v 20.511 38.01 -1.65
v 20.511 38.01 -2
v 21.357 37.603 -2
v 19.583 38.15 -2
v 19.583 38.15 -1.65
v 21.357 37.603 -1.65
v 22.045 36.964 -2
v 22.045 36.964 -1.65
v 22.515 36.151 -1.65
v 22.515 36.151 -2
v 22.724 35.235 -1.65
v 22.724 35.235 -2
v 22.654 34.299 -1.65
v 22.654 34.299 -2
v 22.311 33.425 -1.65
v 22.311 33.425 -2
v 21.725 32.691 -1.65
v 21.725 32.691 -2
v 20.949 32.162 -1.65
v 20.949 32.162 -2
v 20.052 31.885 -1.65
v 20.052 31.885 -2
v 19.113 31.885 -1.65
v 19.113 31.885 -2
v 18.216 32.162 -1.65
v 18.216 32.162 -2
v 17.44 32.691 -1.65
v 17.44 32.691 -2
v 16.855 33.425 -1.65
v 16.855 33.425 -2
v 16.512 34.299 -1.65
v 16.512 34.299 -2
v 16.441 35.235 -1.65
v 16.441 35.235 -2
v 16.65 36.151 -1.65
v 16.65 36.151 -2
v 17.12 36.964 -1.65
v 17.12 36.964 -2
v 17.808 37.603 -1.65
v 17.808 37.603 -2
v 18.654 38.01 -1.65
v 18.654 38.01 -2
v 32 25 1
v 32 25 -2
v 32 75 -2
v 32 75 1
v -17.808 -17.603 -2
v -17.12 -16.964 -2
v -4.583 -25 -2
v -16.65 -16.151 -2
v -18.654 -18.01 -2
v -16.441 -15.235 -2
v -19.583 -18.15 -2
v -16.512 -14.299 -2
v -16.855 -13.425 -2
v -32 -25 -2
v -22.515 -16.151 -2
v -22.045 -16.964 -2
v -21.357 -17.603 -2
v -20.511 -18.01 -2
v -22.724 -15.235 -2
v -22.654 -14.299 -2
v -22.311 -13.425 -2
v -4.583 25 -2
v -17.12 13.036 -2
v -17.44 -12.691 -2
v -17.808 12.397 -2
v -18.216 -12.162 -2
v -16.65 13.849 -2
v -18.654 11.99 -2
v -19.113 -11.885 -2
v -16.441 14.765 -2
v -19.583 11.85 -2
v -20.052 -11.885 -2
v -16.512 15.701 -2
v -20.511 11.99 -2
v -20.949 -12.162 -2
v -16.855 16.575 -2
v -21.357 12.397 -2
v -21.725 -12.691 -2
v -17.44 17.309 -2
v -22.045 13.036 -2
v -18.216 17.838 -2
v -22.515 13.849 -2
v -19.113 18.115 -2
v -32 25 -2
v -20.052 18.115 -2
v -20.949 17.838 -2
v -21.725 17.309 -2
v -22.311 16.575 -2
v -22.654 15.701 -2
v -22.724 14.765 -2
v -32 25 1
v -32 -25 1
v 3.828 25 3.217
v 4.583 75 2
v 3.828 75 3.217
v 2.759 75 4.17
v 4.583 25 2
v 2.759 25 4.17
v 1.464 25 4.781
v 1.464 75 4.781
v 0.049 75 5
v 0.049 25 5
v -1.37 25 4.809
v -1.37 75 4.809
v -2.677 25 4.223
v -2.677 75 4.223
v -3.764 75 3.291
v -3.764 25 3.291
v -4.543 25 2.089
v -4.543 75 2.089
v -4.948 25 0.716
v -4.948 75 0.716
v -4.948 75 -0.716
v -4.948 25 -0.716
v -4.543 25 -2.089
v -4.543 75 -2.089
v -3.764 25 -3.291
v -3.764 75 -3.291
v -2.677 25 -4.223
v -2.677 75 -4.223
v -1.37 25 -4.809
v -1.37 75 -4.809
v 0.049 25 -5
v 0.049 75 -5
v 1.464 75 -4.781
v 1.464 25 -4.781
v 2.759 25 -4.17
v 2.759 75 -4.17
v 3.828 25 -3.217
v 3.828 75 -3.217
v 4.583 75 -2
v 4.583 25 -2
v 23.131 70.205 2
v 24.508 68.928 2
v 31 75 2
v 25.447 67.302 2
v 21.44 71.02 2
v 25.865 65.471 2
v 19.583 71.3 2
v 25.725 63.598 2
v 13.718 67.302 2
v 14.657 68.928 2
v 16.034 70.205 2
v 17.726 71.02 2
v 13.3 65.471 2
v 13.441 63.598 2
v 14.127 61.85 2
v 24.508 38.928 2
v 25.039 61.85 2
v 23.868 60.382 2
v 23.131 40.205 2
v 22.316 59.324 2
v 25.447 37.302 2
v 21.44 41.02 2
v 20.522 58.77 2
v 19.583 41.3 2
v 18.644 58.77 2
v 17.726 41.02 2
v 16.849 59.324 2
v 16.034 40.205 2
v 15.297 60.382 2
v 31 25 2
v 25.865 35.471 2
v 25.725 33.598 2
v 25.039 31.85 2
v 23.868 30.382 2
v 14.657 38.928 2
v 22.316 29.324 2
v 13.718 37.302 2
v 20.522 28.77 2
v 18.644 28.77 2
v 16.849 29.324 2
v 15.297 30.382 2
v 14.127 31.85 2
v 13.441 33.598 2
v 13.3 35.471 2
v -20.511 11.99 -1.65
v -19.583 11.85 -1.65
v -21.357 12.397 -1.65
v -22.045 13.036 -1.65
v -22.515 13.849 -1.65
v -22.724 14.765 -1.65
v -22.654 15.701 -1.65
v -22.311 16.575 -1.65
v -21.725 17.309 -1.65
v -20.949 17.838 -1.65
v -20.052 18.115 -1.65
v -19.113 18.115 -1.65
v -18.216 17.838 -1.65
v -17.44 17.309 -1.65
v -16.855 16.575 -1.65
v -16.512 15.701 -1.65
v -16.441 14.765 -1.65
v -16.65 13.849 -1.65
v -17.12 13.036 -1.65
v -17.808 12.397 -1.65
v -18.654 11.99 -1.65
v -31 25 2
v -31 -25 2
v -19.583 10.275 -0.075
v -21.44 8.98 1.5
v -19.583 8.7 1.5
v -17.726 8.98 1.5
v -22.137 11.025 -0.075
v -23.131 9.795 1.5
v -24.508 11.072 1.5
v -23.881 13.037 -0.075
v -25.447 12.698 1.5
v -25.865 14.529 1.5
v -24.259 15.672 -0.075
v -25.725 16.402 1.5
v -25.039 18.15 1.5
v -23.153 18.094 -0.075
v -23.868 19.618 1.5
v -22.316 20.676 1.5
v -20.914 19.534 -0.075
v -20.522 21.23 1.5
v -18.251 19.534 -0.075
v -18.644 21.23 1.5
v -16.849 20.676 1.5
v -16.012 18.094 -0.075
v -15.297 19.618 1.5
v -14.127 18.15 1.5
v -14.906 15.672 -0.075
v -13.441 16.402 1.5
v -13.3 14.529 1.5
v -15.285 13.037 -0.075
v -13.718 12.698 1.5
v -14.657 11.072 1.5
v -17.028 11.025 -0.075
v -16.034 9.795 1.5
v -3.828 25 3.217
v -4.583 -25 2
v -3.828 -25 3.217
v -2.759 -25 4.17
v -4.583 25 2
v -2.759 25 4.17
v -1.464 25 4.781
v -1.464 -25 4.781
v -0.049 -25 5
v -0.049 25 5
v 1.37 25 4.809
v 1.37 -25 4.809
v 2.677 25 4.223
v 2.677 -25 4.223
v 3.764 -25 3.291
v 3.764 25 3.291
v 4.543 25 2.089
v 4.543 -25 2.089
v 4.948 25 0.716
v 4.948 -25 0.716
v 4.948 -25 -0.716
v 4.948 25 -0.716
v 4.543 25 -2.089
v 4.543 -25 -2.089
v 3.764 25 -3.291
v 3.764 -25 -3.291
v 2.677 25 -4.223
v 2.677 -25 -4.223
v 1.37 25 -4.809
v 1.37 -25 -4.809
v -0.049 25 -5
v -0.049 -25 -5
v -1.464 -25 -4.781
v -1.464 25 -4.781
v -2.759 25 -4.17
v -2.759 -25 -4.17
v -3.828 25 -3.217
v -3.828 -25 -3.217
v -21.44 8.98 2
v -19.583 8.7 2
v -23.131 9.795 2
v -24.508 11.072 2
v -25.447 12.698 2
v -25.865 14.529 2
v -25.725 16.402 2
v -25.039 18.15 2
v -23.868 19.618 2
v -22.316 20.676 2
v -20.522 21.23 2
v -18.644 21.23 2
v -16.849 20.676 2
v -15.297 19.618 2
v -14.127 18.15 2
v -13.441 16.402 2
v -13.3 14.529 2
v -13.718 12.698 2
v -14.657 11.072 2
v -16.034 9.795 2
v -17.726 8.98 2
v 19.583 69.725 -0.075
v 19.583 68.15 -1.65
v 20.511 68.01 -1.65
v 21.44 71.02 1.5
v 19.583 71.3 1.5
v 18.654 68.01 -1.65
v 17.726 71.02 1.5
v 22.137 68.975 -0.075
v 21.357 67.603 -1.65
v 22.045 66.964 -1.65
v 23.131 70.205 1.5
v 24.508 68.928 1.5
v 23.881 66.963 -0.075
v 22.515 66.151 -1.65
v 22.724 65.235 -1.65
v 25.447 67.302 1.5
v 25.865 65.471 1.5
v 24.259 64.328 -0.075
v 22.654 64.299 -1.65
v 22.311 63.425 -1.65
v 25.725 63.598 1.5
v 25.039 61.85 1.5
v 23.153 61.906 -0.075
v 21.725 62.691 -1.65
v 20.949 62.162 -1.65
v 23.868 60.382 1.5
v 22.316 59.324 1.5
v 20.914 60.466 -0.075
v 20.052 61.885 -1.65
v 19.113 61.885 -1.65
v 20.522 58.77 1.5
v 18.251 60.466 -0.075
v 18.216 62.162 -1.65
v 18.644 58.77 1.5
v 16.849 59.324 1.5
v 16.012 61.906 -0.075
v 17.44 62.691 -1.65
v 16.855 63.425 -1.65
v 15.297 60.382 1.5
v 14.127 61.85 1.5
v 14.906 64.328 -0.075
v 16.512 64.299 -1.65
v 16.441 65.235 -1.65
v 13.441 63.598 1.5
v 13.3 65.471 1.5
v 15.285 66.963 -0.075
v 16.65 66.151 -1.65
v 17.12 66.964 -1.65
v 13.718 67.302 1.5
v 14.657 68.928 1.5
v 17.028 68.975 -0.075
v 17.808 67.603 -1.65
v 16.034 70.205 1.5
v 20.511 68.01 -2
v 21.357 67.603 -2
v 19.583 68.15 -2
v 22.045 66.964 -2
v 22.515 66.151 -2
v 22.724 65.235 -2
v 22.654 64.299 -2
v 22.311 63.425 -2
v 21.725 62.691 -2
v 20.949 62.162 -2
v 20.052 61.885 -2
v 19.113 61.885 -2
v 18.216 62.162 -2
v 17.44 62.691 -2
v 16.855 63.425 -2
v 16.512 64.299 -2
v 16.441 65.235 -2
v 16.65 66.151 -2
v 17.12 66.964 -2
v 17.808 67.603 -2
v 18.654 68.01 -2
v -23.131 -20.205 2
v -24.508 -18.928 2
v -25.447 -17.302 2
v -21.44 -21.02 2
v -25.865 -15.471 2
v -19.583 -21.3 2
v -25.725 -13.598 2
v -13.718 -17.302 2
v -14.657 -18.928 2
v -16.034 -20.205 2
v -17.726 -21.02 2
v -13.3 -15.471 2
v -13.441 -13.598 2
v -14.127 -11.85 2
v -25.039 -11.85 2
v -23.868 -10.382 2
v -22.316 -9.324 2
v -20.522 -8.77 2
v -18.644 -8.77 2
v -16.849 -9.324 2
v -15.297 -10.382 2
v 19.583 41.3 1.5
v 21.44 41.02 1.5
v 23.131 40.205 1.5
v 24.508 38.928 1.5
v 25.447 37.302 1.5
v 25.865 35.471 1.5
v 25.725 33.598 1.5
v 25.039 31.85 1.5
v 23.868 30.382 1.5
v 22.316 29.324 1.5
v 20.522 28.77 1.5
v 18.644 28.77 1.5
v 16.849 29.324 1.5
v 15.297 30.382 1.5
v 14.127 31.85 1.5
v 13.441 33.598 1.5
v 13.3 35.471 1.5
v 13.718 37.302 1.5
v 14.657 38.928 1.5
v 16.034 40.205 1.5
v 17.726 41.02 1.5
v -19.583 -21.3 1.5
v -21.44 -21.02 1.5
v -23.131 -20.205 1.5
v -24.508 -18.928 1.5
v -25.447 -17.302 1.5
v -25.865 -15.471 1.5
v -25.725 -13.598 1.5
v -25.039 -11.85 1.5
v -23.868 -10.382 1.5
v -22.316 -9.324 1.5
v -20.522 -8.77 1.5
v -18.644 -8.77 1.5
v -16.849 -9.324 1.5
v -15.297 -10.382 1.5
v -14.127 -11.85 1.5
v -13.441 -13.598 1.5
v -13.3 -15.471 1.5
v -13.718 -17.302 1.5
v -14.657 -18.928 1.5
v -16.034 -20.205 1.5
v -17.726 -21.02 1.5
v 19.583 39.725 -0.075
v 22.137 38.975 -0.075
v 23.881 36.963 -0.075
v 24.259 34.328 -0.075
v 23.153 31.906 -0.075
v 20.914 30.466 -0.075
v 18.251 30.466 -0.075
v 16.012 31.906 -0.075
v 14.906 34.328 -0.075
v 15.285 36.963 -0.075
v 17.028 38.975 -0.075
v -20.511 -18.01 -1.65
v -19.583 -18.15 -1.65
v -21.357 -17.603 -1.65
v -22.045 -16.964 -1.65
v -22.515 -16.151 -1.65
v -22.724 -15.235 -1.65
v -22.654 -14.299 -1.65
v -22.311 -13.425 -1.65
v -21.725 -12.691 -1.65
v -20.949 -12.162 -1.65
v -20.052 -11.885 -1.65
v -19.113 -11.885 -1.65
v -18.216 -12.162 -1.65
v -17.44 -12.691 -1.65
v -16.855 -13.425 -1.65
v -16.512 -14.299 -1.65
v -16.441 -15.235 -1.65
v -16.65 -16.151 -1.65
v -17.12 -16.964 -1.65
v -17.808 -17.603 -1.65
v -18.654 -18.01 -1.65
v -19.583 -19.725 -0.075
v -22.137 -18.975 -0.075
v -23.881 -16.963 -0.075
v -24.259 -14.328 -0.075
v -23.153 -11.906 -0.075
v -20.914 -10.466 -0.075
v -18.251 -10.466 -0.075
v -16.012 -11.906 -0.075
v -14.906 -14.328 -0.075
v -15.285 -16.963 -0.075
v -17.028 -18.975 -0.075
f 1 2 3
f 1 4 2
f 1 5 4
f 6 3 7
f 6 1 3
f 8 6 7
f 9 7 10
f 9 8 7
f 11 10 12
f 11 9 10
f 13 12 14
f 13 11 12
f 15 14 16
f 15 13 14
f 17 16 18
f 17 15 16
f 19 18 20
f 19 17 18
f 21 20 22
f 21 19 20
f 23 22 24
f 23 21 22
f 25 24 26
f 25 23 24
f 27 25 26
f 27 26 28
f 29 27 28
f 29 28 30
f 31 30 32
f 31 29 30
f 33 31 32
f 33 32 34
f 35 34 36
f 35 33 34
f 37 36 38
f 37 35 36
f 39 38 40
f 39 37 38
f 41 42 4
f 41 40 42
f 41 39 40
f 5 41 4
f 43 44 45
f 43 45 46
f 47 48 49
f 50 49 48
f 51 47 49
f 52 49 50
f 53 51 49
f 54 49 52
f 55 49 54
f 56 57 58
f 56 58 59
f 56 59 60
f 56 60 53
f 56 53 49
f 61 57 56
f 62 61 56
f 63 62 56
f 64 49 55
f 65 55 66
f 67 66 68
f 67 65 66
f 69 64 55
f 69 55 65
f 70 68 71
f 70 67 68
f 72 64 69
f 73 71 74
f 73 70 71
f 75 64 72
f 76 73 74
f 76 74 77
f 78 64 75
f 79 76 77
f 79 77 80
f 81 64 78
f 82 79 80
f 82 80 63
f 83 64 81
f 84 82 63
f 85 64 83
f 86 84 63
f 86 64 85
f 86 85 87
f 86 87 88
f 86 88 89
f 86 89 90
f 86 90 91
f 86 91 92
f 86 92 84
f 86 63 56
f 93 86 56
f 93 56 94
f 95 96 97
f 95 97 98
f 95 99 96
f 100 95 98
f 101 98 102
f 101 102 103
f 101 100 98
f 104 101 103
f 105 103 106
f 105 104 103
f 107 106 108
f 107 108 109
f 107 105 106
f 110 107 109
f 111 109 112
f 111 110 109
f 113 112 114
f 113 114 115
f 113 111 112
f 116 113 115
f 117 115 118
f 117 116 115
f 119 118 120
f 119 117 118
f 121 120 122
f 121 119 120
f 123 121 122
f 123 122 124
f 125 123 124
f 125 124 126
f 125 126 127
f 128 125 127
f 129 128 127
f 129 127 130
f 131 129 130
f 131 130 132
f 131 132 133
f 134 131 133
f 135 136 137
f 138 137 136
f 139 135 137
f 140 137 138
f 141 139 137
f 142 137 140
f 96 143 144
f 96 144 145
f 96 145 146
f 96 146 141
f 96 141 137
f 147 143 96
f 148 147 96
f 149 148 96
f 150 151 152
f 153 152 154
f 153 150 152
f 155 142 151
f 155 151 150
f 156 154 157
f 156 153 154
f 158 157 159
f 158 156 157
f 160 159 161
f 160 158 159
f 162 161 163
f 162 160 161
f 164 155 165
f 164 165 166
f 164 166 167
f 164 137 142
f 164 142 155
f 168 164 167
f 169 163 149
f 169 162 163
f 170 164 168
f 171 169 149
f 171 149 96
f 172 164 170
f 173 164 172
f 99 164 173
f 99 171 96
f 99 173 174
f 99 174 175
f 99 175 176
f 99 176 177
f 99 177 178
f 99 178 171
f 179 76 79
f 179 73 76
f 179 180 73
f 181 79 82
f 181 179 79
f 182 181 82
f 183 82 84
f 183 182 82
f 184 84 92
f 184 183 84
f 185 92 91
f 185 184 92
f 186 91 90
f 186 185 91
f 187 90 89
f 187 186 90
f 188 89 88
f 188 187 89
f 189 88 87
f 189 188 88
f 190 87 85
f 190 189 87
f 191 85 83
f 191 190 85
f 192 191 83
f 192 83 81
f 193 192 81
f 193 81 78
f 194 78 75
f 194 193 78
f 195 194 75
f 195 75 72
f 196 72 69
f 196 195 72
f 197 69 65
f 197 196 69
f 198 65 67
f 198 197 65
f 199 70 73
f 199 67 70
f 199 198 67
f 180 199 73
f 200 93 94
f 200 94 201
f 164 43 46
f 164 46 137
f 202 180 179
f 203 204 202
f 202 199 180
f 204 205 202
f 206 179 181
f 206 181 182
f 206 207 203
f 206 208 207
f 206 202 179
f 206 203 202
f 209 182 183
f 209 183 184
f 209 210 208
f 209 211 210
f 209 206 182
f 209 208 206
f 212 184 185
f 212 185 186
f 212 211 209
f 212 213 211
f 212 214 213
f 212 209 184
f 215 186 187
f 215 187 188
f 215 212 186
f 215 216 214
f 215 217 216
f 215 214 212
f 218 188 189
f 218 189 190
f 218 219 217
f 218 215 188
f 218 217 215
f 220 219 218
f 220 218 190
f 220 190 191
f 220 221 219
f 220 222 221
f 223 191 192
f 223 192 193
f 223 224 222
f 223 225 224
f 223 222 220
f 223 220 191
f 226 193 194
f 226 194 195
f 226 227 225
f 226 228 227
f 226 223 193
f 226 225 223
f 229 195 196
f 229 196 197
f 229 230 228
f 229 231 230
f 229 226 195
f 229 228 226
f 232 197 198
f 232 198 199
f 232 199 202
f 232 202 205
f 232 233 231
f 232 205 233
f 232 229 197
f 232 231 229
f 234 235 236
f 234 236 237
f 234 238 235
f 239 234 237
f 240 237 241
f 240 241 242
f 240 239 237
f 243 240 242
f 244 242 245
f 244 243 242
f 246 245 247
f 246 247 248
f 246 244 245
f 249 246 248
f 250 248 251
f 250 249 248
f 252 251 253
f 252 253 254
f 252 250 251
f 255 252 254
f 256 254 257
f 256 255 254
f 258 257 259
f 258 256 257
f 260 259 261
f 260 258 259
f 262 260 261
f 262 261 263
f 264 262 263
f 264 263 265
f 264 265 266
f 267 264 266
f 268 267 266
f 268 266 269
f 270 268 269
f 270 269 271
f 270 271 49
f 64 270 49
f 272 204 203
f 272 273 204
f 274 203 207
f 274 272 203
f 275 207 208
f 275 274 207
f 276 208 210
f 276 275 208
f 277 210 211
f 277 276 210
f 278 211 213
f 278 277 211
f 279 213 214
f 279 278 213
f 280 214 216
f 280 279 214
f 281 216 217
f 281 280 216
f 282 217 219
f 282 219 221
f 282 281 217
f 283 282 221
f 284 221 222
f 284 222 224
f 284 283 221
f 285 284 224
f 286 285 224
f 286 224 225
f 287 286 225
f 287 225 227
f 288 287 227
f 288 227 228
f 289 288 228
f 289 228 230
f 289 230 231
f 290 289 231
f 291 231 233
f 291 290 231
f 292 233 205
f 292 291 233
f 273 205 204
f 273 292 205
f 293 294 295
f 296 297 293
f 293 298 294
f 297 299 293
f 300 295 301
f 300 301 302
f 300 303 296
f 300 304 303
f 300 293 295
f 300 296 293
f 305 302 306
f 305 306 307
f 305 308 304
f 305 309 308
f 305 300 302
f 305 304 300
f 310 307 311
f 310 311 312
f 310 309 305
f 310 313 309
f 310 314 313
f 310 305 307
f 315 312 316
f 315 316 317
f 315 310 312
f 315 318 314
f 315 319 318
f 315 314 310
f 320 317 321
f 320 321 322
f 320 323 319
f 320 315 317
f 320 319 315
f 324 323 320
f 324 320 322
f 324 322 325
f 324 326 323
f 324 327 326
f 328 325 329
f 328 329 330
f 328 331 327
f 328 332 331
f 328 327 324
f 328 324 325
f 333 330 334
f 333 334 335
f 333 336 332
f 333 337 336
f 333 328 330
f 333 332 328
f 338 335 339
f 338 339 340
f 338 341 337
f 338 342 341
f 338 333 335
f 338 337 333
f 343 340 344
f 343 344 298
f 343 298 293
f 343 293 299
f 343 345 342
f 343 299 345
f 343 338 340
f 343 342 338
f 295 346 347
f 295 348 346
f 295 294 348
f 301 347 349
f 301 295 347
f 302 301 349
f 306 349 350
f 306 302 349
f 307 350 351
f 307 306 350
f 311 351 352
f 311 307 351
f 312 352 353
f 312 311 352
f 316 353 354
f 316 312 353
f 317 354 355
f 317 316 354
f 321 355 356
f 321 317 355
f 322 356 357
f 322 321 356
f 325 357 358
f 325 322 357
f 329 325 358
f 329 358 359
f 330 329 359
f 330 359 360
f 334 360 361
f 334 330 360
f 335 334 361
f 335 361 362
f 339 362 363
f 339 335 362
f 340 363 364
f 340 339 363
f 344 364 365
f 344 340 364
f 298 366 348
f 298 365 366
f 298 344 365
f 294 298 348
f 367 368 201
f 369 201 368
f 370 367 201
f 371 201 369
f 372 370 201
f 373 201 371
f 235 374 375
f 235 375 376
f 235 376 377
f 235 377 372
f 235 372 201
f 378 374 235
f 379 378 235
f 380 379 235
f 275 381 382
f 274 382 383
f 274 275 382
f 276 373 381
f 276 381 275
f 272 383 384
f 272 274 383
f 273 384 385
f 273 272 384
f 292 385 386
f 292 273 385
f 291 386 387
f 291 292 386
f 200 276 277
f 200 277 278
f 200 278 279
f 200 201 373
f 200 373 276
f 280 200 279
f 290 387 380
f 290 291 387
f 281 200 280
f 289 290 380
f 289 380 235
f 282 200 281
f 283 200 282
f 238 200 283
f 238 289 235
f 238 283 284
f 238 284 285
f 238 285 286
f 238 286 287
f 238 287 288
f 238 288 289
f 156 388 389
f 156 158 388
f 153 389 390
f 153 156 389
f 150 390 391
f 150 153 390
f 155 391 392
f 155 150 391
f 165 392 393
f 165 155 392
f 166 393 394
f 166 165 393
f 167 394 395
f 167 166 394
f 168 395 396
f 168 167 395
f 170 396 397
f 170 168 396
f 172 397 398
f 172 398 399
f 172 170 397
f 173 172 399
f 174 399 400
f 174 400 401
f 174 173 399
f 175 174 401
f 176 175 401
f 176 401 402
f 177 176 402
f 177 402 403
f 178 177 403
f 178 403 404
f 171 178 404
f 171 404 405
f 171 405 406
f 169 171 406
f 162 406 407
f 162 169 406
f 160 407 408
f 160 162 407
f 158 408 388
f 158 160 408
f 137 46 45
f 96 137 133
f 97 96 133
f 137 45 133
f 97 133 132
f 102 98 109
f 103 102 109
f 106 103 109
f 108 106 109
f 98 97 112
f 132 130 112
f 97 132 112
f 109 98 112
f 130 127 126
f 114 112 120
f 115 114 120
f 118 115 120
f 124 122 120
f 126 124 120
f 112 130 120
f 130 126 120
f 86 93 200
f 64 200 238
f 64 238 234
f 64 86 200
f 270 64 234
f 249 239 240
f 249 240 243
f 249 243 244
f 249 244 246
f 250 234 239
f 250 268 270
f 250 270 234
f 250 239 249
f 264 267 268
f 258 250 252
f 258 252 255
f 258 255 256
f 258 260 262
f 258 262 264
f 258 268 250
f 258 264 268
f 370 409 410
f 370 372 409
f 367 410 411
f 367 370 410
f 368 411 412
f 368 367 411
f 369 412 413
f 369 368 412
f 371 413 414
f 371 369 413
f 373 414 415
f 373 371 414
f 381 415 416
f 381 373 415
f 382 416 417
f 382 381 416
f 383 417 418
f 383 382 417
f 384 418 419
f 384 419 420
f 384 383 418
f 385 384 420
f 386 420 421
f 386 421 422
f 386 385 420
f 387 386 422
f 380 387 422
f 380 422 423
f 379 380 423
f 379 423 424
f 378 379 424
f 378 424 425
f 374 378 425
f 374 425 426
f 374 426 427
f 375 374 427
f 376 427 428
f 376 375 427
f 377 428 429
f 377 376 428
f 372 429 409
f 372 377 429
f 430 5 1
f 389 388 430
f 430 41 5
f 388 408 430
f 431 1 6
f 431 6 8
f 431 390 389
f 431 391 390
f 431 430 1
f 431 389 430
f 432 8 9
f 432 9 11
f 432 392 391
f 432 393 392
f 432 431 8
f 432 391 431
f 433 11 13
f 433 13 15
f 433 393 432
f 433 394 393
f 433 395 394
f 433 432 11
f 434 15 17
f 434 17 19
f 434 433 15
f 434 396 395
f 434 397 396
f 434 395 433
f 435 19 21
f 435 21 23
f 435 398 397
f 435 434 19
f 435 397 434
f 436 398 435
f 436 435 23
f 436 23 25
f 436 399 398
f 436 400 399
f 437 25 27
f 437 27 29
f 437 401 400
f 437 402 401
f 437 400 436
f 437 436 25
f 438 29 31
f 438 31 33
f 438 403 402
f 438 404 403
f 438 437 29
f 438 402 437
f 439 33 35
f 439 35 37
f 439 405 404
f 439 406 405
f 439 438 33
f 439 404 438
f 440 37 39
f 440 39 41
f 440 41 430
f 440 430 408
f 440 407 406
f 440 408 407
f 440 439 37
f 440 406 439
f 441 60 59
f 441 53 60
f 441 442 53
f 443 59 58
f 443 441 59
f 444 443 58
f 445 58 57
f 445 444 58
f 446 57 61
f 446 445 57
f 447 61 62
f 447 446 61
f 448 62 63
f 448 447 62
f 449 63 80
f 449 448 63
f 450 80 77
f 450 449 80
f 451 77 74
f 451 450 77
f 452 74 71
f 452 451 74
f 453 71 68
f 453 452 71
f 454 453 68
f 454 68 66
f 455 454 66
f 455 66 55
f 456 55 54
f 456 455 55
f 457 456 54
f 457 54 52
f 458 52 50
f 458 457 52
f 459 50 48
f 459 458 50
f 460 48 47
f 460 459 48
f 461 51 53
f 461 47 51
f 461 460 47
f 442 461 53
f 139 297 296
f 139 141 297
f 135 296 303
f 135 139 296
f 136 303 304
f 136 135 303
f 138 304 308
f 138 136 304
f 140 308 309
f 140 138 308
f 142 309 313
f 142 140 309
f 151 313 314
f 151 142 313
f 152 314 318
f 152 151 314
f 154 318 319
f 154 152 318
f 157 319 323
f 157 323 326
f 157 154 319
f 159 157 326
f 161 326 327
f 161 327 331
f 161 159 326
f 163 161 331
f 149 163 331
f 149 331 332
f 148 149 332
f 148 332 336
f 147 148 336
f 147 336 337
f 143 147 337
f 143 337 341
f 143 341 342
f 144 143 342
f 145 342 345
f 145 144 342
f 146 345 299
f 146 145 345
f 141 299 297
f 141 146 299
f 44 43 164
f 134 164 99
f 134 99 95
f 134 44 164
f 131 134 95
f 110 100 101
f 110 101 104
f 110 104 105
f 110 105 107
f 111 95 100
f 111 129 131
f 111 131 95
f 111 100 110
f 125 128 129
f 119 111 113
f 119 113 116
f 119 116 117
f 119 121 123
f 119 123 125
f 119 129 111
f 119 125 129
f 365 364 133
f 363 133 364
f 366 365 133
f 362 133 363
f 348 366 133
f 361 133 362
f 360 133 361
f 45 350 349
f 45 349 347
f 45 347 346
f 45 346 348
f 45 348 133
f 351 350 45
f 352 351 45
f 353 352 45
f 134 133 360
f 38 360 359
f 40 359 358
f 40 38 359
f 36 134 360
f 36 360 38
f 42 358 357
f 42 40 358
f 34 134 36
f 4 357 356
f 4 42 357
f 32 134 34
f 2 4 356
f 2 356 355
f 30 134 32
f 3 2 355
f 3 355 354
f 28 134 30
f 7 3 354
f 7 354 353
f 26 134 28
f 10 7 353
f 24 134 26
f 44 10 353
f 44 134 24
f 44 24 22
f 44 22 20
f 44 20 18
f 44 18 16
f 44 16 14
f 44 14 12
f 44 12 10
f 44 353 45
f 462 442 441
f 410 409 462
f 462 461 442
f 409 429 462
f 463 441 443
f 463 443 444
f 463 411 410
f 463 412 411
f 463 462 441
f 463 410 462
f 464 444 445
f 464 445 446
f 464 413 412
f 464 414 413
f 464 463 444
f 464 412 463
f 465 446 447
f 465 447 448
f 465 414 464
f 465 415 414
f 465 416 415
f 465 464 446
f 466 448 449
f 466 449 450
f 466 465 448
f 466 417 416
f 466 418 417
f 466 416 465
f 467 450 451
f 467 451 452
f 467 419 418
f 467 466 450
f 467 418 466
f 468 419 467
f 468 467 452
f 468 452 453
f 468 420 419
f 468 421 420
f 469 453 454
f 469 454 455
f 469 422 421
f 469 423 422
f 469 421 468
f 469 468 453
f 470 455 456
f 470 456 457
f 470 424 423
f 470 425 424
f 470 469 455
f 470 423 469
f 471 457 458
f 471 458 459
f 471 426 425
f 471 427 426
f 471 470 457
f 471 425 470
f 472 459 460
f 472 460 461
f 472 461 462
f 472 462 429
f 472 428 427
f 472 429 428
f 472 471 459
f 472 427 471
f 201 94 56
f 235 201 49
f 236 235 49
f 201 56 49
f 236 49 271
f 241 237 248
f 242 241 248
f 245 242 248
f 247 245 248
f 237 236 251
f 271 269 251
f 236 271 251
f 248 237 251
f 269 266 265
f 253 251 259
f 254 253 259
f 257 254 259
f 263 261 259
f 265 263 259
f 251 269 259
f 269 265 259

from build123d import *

# Parameters (mm, degrees)
EXTRUDE_1_DEPTH            = 25
HOLE_WIZARD_M61_AT_2_COUNT = 2
HOLE_WIZARD_M61_AT_2_PITCH = 30
PATTERN_CIRCULAR_1_COUNT   = 2


with BuildPart() as part:
    # Эскиз1 → Бобышка-Вытянуть1 (new body, symmetric)
    with BuildSketch(Plane(origin=(0, 0, 0), x_dir=(1, 0, 0), z_dir=(0, 1, 0))):
        with BuildLine():
            Line((-4.582575695, 2), (-32, 2))
            Line((-32, 2), (-32, -1))
            Line((-32, -1), (-31, -2))
            Line((-31, -2), (-4.582575695, -2))
            ThreePointArc((-4.582575695, -2), (5, 0), (-4.582575695, 2))
        make_face()
    extrude(amount=EXTRUDE_1_DEPTH, both=True)

    # Эскиз6 → Зенковка для винта с полупотайной головкой M61 (revolve, cut)
    with BuildSketch(Plane(origin=(-19.582575695, 15, 2), x_dir=(0, -1, 0), z_dir=(1, 0, 0))):
        Polygon((0, 0), (0, 7), (3.15, 7), (3.15, 3.65), (6.3, 0.5), (6.3, 0), align=None)
    hole_wizard_m61 = revolve(axis=Axis((-19.582575695, 15, 8.35), (0, 0, -1)), mode=Mode.SUBTRACT)

    # Зенковка для винта с полупотайной головкой M61 at 2: Зенковка для винта с полупотайной головкой M61 ×2
    with Locations(*[(0, -i * HOLE_WIZARD_M61_AT_2_PITCH, 0) for i in range(1, HOLE_WIZARD_M61_AT_2_COUNT)]):
        add(hole_wizard_m61, mode=Mode.SUBTRACT)


with BuildPart() as pattern_circular_1_1:
    # Круговой массив1: pattern copy
    add(part.part.rotate(Axis((0, 25, 0), (0, 0, 1)), 1 * 360 / PATTERN_CIRCULAR_1_COUNT))


solid = Compound([part.part, pattern_circular_1_1.part])
